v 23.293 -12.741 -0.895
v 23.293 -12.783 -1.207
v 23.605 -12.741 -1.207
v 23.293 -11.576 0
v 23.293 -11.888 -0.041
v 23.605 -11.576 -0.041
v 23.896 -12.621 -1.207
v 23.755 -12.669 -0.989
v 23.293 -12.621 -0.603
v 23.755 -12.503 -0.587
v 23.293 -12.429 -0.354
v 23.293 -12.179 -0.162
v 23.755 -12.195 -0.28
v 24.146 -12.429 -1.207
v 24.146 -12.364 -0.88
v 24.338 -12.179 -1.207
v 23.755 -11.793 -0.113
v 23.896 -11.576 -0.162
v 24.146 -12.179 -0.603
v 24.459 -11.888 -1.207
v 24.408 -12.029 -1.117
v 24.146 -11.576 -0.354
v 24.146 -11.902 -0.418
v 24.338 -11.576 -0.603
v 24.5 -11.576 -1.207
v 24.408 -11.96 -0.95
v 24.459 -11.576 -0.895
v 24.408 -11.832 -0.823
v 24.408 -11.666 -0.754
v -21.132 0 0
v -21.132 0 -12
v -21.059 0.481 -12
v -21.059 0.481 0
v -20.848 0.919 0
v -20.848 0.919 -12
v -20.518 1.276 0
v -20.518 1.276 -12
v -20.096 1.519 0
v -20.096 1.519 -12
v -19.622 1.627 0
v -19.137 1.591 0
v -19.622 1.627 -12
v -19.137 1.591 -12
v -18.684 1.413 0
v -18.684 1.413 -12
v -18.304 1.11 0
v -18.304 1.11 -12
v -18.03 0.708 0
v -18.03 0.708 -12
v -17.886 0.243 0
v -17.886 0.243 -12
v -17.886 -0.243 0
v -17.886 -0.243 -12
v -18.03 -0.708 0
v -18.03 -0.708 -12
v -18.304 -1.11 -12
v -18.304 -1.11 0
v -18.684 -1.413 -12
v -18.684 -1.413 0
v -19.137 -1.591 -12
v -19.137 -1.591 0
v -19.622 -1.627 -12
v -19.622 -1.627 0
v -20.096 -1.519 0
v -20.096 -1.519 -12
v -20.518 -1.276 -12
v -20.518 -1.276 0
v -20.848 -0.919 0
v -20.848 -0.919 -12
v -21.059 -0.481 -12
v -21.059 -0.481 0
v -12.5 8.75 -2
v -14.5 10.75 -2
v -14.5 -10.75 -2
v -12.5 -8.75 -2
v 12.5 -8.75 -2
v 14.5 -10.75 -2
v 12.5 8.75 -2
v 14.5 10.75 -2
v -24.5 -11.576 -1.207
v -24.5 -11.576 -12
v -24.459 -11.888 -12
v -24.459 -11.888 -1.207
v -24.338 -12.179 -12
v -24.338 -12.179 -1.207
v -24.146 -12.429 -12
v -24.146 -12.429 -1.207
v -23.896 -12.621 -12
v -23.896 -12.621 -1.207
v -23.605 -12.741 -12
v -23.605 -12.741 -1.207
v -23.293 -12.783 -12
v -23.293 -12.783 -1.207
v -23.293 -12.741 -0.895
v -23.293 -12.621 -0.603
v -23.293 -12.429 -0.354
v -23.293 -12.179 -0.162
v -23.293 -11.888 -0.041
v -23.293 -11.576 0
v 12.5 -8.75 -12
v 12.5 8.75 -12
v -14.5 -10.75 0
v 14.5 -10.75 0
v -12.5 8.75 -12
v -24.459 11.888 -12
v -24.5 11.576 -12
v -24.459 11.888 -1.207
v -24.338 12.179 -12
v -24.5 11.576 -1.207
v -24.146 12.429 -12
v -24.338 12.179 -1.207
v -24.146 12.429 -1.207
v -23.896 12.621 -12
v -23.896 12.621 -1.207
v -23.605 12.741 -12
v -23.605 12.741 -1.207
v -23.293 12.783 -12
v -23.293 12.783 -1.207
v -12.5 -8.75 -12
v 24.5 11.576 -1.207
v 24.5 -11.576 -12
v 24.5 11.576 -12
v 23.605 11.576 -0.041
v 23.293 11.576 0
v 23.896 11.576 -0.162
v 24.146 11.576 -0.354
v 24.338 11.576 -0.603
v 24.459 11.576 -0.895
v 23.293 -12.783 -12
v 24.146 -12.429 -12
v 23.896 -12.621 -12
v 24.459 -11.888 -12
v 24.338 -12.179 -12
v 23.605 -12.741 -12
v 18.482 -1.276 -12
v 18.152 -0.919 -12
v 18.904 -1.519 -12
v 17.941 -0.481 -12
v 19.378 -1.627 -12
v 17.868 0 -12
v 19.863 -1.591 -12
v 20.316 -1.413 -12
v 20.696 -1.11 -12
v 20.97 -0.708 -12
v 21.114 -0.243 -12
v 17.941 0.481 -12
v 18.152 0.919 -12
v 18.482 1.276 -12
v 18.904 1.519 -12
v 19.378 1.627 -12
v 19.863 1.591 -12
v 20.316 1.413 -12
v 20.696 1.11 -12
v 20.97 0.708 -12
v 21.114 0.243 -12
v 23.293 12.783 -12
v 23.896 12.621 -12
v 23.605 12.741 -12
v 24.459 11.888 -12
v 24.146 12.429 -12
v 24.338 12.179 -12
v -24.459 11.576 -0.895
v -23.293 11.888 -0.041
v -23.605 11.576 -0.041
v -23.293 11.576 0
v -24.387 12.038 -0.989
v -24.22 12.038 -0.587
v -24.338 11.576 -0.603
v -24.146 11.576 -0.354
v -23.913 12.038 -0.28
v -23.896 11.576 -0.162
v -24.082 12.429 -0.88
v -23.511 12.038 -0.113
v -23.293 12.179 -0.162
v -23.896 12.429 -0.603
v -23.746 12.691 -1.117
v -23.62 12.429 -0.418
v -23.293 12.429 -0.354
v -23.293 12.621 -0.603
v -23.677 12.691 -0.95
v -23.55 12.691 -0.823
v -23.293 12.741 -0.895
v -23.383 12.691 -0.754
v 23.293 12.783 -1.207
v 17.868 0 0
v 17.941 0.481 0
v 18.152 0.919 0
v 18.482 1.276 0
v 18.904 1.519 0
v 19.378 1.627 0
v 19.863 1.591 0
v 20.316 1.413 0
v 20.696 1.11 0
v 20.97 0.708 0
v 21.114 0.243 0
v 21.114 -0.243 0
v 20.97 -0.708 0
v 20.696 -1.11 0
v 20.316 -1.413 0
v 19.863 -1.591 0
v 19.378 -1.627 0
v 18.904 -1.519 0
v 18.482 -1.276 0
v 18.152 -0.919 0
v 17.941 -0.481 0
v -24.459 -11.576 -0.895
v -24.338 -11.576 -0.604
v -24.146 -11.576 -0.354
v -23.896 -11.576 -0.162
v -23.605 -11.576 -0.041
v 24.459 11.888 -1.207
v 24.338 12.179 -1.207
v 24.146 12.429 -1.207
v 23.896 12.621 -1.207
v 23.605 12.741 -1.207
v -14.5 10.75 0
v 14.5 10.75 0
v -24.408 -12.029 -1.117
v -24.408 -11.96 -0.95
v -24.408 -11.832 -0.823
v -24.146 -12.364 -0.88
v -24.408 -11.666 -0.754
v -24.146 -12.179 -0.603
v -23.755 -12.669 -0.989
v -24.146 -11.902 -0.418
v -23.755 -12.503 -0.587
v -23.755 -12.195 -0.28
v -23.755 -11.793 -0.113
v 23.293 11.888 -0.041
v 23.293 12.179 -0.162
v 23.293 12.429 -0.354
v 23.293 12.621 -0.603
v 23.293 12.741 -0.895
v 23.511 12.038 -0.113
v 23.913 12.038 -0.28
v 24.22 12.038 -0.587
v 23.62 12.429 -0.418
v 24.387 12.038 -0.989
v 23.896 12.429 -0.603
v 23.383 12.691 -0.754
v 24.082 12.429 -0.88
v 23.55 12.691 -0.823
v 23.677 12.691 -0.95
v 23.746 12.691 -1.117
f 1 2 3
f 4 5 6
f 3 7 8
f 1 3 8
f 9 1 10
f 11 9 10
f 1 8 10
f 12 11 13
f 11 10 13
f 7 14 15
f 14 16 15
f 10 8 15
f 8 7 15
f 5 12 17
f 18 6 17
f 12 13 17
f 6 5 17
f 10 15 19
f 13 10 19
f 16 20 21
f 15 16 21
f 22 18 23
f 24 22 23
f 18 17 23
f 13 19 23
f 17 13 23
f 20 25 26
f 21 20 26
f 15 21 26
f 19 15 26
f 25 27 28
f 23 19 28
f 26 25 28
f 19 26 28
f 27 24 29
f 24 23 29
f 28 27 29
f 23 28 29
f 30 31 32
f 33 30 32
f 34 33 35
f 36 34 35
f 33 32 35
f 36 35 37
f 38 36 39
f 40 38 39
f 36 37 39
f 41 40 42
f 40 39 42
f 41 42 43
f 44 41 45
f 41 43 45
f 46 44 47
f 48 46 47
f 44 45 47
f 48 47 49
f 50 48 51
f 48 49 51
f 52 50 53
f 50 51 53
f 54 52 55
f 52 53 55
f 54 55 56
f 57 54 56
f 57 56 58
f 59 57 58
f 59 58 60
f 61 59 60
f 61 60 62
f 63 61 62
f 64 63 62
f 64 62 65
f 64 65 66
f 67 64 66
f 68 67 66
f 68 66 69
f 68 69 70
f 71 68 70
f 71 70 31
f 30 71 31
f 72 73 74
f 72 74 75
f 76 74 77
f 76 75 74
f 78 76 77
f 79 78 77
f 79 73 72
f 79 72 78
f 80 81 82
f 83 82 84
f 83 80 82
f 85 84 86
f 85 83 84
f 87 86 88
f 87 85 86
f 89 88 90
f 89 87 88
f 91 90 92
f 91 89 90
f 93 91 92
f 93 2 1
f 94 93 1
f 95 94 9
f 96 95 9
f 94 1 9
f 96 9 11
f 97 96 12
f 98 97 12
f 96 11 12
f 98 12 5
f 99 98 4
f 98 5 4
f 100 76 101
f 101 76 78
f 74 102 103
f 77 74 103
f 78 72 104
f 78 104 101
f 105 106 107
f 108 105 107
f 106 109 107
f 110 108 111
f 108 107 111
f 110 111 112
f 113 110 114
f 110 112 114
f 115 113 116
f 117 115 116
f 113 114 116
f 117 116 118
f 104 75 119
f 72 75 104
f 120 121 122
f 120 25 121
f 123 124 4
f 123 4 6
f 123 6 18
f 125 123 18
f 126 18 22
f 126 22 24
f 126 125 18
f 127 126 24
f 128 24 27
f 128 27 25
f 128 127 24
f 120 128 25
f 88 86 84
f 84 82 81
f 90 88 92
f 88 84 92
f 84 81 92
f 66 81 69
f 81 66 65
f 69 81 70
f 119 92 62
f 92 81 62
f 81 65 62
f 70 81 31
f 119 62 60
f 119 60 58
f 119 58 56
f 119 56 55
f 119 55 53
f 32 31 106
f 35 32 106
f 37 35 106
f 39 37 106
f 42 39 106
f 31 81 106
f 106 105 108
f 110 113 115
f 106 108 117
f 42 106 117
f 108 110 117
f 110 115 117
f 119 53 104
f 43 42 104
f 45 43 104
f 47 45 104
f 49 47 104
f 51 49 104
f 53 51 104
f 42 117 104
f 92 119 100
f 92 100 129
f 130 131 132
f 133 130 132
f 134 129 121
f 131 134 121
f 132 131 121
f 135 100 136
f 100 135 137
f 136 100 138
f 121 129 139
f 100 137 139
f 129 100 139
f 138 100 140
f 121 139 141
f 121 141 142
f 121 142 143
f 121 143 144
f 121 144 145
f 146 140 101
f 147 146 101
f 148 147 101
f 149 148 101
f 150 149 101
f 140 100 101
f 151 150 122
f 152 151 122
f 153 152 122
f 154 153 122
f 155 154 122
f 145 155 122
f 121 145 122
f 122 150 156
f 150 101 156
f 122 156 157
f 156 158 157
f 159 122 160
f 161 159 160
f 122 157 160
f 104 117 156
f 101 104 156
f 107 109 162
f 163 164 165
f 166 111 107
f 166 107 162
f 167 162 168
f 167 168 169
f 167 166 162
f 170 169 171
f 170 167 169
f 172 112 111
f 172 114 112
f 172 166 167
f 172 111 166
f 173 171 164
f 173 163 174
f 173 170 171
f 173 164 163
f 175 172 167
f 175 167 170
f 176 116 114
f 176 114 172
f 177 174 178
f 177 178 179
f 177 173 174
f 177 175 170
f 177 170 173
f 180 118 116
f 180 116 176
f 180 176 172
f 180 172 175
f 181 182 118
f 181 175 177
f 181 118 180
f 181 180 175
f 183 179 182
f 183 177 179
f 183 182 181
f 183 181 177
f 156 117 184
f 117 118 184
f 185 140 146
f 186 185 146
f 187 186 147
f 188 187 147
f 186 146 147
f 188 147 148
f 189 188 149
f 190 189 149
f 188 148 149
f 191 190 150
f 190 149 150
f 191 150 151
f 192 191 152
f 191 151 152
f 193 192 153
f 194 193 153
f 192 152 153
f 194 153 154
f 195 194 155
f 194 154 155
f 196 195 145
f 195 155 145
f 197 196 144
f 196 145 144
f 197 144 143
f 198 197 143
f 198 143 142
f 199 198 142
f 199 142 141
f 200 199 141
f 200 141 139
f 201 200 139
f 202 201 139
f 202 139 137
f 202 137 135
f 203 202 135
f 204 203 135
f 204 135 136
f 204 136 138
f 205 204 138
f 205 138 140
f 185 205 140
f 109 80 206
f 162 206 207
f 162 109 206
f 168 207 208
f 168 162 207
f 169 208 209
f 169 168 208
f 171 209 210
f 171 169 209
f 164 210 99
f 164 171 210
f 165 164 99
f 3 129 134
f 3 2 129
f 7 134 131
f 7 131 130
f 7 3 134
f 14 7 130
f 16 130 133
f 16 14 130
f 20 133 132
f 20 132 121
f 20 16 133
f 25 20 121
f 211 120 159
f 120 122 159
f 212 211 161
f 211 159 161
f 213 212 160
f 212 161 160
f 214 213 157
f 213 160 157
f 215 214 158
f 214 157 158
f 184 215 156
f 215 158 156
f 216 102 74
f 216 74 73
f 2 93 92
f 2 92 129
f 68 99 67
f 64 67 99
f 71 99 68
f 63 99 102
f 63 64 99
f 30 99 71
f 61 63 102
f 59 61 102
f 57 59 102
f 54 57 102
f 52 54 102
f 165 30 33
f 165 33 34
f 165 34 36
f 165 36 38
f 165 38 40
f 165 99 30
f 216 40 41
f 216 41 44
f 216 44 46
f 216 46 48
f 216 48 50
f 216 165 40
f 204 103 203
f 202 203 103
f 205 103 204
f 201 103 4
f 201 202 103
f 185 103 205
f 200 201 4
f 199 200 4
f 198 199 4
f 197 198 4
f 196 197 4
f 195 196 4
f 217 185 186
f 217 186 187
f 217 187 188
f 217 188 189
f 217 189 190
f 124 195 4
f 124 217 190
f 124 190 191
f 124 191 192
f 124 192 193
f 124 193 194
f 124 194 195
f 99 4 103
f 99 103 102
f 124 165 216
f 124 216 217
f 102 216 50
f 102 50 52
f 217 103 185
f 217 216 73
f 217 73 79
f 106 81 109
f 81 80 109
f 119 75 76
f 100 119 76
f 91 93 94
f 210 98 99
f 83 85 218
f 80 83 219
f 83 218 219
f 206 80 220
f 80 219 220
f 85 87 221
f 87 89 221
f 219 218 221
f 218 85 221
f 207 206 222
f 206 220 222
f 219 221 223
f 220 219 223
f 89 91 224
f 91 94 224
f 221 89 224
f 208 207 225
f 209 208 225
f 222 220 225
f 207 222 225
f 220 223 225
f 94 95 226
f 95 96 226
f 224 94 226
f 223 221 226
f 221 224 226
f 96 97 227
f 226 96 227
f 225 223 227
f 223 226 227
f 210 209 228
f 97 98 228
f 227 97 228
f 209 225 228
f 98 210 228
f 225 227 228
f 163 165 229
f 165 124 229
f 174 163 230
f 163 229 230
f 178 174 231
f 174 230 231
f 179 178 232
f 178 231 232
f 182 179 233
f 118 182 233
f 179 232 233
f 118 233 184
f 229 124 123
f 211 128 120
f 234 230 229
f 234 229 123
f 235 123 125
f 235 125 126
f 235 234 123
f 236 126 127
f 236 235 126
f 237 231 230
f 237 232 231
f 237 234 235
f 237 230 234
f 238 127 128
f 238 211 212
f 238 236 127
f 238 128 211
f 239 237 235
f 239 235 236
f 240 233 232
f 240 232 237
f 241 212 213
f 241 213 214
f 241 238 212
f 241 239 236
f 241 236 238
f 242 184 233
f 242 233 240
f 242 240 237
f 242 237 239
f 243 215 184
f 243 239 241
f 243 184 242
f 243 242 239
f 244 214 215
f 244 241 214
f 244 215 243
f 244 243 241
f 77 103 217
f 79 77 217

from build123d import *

# Parameters (mm, degrees)
F0_W     = 49
F0_H     = 25.5652221807
F1_DEPTH = 12
F2_W     = 29
F2_H     = 21.5
F3_DEPTH = 2
F4_W     = 25
F4_H     = 17.5
F5_DEPTH = 12
F7_D     = 3.2639
F8_R     = 1.207
F9_R     = 1.207
F10_R    = 1.207
F11_R    = 1.207


# Not quite as in the source:
# - a feature names something its author has since deleted; it is built from what else it names


with BuildPart() as f1:
    # F0 (on Top) → F1 (new body)
    with BuildSketch(Plane.XY):
        Rectangle(F0_W, F0_H)
    extrude(amount=-F1_DEPTH)

    # F2 (on face) → F3 (cut)
    with BuildSketch(Plane.XY):
        Rectangle(F2_W, F2_H)
    extrude(amount=-F3_DEPTH, mode=Mode.SUBTRACT)

    # F4 (on Top) → F5 (cut)
    with BuildSketch(Plane.XY):
        Rectangle(F4_W, F4_H)
    extrude(amount=-F5_DEPTH, mode=Mode.SUBTRACT)

    # F7 (through all)
    with Locations(Plane.XY):
        with Locations((-19.5, 0), (19.5, 0)):
            Hole(F7_D / 2)

    # F8
    f8_edges = [f1.edges().sort_by_distance(p)[0] for p in [
        (0, -12.782611, 0),
    ]]
    fillet(f8_edges, radius=F8_R)

    # F9
    f9_edges = [f1.edges().sort_by_distance(p)[0] for p in [
        (24.5, 0.6035, 0),
    ]]
    fillet(f9_edges, radius=F9_R)

    # F10
    f10_edges = [f1.edges().sort_by_distance(p)[0] for p in [
        (-24.5, 0.6035, 0),
    ]]
    fillet(f10_edges, radius=F10_R)

    # F11
    f11_edges = [f1.edges().sort_by_distance(p)[0] for p in [
        (0, 12.782611, 0),
    ]]
    fillet(f11_edges, radius=F11_R)


solid = f1.part
